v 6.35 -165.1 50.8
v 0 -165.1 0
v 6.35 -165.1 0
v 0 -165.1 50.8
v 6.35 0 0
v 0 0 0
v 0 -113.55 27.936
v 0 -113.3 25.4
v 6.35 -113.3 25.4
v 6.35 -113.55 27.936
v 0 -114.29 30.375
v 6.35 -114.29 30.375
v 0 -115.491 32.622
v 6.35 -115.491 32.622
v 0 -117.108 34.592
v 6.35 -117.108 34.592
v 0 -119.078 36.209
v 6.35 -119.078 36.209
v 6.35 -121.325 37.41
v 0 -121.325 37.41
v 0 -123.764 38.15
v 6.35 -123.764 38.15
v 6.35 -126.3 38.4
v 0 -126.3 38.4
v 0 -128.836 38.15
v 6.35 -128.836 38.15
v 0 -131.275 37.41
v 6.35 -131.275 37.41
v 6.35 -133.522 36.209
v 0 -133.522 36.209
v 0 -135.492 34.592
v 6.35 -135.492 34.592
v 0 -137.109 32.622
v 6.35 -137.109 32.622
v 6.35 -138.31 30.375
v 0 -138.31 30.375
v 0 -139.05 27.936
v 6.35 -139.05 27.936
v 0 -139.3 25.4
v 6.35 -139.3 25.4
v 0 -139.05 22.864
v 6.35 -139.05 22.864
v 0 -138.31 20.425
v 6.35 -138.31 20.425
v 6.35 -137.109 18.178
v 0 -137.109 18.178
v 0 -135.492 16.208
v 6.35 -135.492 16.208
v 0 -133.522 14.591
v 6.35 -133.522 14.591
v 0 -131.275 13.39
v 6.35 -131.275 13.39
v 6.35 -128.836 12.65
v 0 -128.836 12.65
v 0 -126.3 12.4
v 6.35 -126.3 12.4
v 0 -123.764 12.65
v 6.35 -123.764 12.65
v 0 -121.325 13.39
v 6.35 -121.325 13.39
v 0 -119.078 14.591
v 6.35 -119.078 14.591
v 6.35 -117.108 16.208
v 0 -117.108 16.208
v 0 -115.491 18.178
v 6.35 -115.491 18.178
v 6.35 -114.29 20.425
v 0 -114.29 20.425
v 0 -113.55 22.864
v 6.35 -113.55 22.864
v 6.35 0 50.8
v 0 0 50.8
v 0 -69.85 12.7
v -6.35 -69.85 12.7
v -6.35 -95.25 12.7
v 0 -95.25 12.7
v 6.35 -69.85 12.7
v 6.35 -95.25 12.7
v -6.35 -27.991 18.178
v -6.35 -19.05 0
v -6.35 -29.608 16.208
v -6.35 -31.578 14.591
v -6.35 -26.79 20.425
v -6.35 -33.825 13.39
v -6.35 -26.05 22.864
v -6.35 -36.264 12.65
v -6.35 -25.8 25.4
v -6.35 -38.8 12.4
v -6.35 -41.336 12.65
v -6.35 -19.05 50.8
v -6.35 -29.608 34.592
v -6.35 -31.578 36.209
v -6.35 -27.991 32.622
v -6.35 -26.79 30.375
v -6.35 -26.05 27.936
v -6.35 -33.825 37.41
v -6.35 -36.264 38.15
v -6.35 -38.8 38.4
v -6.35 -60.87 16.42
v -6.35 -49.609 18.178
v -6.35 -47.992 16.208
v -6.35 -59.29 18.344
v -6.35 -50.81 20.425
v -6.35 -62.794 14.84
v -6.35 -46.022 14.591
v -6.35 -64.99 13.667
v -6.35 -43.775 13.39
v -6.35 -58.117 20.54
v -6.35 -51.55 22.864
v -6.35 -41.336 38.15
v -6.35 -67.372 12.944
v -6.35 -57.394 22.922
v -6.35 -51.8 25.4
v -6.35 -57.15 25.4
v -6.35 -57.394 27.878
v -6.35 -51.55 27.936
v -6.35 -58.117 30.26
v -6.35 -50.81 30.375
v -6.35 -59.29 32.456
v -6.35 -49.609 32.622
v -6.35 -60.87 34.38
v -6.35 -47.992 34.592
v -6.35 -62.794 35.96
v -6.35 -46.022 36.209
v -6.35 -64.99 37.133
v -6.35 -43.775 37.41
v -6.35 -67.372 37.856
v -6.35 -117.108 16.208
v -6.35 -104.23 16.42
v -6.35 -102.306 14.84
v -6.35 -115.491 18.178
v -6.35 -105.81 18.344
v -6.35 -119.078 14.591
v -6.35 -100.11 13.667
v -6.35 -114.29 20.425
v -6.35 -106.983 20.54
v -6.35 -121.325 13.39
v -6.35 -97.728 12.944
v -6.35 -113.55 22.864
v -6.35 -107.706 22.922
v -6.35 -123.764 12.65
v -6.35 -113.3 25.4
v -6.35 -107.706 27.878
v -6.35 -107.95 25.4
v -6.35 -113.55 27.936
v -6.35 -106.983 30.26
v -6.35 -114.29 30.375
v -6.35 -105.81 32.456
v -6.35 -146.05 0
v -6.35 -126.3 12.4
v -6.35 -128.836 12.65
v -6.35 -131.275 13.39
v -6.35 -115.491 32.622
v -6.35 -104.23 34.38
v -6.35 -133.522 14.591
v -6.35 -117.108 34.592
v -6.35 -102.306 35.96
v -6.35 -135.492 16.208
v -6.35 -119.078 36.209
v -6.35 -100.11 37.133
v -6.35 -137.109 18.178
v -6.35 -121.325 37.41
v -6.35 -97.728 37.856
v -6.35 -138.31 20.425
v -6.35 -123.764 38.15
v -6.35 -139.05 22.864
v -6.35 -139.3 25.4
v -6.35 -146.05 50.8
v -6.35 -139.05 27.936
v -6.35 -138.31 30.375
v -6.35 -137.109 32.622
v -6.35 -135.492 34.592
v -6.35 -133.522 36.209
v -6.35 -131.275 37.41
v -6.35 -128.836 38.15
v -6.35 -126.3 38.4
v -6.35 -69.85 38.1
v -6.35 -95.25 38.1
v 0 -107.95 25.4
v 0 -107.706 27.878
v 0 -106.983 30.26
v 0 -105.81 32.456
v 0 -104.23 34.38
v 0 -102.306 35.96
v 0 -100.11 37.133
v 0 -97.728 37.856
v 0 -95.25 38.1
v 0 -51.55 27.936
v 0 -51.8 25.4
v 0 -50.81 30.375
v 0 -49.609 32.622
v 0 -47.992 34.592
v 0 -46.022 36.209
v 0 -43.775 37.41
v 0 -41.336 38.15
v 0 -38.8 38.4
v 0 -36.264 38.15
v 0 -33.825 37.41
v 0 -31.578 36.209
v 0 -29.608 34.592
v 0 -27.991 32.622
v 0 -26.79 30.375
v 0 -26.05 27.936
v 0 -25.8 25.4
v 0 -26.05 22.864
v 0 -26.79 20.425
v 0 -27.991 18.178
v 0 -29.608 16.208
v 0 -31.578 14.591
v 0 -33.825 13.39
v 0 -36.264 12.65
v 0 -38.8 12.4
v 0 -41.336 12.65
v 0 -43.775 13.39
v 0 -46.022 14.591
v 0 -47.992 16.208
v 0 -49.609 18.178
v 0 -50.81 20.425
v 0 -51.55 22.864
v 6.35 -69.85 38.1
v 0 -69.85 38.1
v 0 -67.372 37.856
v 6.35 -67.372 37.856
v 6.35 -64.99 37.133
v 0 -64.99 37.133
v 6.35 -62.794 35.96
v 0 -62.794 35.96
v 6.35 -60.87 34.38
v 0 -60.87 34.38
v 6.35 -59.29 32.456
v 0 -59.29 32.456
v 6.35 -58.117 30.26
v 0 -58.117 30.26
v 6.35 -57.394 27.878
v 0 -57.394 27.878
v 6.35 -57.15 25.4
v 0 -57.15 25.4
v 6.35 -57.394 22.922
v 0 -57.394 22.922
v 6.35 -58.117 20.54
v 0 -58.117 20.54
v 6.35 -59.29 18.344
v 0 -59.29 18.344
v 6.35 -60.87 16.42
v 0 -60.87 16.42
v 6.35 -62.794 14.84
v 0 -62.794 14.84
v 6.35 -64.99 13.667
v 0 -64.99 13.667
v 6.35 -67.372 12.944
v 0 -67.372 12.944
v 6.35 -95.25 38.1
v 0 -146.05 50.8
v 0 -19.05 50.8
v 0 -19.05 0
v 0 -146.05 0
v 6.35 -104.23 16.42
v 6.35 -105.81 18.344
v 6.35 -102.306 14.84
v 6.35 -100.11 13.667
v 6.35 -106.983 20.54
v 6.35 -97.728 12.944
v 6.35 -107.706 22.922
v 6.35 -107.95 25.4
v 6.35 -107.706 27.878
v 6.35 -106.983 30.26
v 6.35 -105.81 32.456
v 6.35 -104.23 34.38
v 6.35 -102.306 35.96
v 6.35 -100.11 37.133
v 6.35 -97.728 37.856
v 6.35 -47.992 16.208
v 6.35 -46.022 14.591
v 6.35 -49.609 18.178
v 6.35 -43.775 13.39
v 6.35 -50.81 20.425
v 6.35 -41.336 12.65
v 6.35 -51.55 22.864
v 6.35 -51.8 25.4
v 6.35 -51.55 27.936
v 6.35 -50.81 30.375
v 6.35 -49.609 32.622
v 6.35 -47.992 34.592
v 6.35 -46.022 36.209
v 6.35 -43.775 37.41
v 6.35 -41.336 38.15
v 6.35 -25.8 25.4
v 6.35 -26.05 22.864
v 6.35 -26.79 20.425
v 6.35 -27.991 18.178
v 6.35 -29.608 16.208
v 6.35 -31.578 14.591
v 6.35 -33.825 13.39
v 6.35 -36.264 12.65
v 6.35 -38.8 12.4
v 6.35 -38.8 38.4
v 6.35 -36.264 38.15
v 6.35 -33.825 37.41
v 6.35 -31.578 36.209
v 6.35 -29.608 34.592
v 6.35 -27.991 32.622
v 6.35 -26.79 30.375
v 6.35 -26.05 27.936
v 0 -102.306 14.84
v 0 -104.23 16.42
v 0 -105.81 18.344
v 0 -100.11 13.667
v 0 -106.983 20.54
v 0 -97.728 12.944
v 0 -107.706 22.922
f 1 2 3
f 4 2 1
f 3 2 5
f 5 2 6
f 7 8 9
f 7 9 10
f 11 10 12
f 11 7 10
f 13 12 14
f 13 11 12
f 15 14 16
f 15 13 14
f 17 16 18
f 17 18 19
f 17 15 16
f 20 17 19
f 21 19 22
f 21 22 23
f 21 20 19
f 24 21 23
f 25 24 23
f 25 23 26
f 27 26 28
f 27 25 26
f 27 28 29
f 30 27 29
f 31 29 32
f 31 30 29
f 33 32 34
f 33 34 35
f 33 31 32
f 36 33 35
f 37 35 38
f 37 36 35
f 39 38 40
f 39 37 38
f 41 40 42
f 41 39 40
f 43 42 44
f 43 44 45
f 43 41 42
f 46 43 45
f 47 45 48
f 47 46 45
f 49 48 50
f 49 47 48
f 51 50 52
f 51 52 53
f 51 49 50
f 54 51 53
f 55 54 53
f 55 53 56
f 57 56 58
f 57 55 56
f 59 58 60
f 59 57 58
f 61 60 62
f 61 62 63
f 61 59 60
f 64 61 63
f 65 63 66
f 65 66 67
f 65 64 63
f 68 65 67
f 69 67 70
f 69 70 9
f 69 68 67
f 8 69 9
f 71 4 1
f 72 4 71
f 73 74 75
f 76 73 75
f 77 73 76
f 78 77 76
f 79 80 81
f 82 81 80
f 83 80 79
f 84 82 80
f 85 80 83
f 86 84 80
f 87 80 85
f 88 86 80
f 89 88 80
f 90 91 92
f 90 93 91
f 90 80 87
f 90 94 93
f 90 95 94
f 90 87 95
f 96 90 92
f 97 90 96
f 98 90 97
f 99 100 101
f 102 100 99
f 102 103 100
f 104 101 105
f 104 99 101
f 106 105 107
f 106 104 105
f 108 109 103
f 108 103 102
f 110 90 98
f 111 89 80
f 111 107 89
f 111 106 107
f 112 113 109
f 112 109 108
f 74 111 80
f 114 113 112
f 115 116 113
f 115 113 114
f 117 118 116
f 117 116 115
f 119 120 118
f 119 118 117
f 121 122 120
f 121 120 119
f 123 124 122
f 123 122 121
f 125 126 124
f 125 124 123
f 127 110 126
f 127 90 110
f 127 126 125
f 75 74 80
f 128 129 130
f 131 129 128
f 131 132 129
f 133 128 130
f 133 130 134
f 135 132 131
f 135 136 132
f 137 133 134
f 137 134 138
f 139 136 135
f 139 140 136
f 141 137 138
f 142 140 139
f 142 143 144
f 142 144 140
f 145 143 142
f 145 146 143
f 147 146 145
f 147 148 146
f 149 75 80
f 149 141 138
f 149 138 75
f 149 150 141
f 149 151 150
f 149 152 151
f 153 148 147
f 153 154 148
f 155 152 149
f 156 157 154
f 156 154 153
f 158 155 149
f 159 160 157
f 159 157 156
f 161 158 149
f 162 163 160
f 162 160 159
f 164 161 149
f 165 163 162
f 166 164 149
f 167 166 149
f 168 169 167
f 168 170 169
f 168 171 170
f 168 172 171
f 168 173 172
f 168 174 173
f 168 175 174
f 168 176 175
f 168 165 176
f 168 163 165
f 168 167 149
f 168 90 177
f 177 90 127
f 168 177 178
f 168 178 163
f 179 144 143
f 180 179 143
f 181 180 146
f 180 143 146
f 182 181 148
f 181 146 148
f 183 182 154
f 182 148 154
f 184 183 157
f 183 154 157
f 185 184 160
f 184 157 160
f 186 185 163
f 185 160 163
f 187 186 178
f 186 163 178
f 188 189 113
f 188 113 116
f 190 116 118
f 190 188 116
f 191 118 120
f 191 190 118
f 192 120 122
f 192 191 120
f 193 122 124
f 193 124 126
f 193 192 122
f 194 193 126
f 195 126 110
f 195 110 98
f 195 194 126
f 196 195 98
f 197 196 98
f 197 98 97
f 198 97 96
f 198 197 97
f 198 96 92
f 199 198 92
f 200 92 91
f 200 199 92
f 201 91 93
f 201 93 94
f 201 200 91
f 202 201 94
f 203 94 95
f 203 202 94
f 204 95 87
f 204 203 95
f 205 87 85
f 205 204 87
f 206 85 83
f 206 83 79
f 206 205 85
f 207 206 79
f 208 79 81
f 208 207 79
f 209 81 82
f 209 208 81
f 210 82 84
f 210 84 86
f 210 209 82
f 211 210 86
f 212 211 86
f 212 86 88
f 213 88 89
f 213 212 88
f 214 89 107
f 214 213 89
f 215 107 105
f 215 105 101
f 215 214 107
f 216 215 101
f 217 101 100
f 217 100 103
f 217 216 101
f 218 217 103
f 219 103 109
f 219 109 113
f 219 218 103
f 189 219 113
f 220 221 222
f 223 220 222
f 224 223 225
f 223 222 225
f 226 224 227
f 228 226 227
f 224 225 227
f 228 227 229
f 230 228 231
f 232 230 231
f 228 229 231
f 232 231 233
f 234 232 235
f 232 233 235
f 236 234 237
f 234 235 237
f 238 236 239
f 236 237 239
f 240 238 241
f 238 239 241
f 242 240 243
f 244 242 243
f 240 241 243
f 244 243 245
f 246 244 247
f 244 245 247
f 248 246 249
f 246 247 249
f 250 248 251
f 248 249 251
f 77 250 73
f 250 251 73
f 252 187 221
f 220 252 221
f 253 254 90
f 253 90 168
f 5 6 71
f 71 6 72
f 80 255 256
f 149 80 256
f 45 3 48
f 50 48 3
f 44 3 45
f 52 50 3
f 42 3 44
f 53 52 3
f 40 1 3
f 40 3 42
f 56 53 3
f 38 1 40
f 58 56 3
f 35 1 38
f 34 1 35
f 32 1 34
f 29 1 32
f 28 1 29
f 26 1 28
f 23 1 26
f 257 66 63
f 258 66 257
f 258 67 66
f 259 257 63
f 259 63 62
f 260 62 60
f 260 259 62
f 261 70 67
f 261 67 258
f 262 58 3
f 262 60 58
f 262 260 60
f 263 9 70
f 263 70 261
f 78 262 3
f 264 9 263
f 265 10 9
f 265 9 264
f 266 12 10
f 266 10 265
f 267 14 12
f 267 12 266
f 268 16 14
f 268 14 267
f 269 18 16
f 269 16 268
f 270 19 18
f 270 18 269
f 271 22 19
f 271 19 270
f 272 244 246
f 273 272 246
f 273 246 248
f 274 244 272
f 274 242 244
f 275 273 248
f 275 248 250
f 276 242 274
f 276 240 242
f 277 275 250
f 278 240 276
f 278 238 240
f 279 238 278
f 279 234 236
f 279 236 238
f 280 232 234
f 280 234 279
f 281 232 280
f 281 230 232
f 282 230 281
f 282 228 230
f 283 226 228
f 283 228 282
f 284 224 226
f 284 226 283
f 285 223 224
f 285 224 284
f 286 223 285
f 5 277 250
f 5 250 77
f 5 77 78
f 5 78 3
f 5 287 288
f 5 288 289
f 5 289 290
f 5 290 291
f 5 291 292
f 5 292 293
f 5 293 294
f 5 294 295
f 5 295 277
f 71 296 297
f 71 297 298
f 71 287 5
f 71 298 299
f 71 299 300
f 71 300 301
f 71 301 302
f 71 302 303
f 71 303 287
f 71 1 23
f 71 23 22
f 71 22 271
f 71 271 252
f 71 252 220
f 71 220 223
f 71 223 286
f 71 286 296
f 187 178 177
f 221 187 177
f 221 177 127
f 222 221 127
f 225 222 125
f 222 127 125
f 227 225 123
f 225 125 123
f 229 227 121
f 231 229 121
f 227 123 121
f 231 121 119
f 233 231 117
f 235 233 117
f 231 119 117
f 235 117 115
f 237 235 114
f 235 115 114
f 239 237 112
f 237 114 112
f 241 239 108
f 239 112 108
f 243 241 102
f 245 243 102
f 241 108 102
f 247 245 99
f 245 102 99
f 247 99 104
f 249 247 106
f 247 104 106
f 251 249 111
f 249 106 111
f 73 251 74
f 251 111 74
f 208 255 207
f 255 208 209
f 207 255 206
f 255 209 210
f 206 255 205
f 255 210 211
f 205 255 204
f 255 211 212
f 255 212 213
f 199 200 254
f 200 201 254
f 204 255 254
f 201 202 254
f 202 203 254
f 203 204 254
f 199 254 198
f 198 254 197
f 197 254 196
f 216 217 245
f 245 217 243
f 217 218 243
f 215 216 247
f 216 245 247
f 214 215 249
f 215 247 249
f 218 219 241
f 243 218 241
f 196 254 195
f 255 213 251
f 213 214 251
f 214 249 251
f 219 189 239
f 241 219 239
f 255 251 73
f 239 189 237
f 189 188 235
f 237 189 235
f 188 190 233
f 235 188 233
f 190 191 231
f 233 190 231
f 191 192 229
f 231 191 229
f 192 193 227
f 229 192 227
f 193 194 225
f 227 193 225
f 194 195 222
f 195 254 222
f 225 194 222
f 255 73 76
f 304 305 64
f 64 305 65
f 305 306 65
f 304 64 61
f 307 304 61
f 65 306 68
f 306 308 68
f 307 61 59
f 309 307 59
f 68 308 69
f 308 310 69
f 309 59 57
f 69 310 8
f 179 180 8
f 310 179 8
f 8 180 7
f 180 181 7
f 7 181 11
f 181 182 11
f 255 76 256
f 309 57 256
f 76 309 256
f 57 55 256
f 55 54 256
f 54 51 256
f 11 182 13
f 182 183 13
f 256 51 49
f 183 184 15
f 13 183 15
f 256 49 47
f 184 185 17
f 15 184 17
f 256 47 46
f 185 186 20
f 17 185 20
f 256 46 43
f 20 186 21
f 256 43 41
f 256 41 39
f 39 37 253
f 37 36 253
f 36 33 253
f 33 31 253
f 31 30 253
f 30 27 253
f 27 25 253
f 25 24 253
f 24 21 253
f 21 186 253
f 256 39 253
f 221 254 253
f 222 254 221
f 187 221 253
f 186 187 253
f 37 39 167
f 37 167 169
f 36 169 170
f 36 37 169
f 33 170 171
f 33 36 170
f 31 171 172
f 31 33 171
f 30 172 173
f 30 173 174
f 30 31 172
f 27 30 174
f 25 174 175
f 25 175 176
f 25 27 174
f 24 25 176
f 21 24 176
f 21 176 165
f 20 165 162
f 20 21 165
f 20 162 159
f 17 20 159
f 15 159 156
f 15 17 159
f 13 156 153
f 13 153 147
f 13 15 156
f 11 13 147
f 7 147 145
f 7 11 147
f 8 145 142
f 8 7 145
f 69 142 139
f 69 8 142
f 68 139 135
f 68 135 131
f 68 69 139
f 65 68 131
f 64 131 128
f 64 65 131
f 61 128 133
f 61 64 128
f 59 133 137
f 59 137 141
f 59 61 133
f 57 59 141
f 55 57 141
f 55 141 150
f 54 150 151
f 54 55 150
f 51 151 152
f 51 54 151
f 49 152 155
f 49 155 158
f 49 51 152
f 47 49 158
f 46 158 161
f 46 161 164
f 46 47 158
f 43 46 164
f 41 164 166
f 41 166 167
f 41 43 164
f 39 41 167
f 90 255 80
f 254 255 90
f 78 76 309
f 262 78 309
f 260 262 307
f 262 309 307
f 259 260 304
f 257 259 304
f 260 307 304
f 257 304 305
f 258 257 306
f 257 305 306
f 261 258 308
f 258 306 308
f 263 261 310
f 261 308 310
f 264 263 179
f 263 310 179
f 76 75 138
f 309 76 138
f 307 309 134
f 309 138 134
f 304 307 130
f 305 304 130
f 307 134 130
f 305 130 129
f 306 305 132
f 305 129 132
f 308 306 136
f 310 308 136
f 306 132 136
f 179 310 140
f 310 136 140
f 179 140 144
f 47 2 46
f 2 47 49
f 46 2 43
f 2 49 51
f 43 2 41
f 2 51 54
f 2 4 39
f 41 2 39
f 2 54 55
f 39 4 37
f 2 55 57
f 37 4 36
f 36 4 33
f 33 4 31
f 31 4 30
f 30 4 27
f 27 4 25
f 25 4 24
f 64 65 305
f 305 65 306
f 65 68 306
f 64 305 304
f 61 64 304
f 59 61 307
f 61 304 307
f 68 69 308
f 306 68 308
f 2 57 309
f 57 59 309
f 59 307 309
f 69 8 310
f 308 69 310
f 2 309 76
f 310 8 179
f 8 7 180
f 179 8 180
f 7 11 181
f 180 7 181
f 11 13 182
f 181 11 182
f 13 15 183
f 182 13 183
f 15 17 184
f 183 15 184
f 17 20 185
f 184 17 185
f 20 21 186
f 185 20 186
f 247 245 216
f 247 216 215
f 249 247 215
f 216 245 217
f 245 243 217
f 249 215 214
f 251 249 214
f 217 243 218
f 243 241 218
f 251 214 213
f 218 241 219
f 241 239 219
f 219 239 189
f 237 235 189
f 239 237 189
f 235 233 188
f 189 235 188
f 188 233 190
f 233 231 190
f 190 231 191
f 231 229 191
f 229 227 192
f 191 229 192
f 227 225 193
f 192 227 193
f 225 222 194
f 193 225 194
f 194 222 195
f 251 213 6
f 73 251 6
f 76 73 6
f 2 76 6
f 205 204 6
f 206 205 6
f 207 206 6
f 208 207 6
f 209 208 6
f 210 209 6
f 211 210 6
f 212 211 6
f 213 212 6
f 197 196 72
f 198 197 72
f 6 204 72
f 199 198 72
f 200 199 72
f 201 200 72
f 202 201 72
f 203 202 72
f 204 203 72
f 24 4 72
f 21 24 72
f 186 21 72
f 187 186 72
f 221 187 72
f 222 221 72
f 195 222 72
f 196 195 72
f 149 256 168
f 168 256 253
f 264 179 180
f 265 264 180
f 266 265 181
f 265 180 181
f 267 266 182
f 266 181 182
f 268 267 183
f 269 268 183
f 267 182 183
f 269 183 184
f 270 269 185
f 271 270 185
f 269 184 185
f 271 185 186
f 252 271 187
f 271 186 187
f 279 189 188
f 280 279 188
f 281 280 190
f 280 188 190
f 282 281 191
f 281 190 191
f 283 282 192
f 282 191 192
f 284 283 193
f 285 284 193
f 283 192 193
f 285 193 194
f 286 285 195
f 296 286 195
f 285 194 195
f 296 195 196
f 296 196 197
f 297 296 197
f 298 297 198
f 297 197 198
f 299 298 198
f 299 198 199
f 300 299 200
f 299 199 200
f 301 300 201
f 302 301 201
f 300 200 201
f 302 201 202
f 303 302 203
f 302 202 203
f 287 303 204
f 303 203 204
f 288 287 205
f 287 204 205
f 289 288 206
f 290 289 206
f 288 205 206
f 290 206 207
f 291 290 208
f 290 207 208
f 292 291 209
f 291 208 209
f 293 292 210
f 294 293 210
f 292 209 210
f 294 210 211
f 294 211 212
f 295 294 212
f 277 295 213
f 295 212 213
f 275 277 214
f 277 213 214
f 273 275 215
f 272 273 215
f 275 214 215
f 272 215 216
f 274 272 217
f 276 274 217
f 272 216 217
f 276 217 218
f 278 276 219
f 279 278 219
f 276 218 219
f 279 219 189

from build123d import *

# Parameters (mm, degrees)
F0_W     = 165.1
F0_H     = 50.8
F0_R     = 13
F1_DEPTH = 6.35
F2_W     = 127
F2_H     = 50.8
F2_R     = 13
F3_DEPTH = 6.35
F5_DEPTH = 12.701


with BuildPart() as f1:
    # F0 (on Right) → F1 (new body)
    with BuildSketch(Plane.YZ):
        with Locations((-82.55, 25.4)):
            Rectangle(F0_W, F0_H)
        with Locations((-126.3, 25.4)):
            Circle(F0_R, mode=Mode.SUBTRACT)
        with BuildLine():
            ThreePointArc((-25.8, 25.4), (-38.8, 12.4), (-51.8, 25.4))
            ThreePointArc((-51.8, 25.4), (-38.8, 38.4), (-25.8, 25.4))
        make_face(mode=Mode.SUBTRACT)
    extrude(amount=F1_DEPTH)


with BuildPart() as f3:
    # F2 (on face) → F3 (new body)
    with BuildSketch(Plane(origin=(0, 0, 0), x_dir=(0, -1, 0), z_dir=(-1, 0, 0))):
        with Locations((82.55, 25.4)):
            Rectangle(F2_W, F2_H)
        with Locations((126.3, 25.4)):
            Circle(F2_R, mode=Mode.SUBTRACT)
        with Locations((38.8, 25.4)):
            Circle(F2_R, mode=Mode.SUBTRACT)
    extrude(amount=F3_DEPTH)


with BuildPart() as f5_tool:
    # F4 (on face) → F5 (new body, through all)
    with BuildSketch(Plane(origin=(-6.35, 0, 0), x_dir=(0, -1, 0), z_dir=(-1, 0, 0))):
        with BuildLine():
            ThreePointArc((69.85, 12.7), (78.830256, 16.419744), (82.55, 25.4))
            ThreePointArc((82.55, 25.4), (78.830256, 34.380256), (69.85, 38.1))
            ThreePointArc((69.85, 38.1), (57.15, 25.4), (69.85, 12.7))
        make_face()
        with BuildLine():
            ThreePointArc((95.25, 12.7), (86.269744, 16.419744), (82.55, 25.4))
            ThreePointArc((82.55, 25.4), (78.830256, 16.419744), (69.85, 12.7))
            Line((69.85, 12.7), (95.25, 12.7))
        make_face()
        with BuildLine():
            ThreePointArc((69.85, 38.1), (78.830256, 34.380256), (82.55, 25.4))
            ThreePointArc((82.55, 25.4), (86.269744, 34.380256), (95.25, 38.1))
            Line((95.25, 38.1), (69.85, 38.1))
        make_face()
        with BuildLine():
            ThreePointArc((95.25, 38.1), (86.269744, 34.380256), (82.55, 25.4))
            ThreePointArc((82.55, 25.4), (86.269744, 16.419744), (95.25, 12.7))
            ThreePointArc((95.25, 12.7), (104.230256, 16.419744), (107.95, 25.4))
            ThreePointArc((107.95, 25.4), (104.230256, 34.380256), (95.25, 38.1))
        make_face()
    extrude(amount=-F5_DEPTH)


with BuildPart() as f1_1:
    add(f1.part)

    # F5: cut by f5_tool
    add(f5_tool.part, mode=Mode.SUBTRACT)


with BuildPart() as f3_1:
    add(f3.part)

    # F5: cut by f5_tool
    add(f5_tool.part, mode=Mode.SUBTRACT)


solid = Compound([f1_1.part, f3_1.part])
